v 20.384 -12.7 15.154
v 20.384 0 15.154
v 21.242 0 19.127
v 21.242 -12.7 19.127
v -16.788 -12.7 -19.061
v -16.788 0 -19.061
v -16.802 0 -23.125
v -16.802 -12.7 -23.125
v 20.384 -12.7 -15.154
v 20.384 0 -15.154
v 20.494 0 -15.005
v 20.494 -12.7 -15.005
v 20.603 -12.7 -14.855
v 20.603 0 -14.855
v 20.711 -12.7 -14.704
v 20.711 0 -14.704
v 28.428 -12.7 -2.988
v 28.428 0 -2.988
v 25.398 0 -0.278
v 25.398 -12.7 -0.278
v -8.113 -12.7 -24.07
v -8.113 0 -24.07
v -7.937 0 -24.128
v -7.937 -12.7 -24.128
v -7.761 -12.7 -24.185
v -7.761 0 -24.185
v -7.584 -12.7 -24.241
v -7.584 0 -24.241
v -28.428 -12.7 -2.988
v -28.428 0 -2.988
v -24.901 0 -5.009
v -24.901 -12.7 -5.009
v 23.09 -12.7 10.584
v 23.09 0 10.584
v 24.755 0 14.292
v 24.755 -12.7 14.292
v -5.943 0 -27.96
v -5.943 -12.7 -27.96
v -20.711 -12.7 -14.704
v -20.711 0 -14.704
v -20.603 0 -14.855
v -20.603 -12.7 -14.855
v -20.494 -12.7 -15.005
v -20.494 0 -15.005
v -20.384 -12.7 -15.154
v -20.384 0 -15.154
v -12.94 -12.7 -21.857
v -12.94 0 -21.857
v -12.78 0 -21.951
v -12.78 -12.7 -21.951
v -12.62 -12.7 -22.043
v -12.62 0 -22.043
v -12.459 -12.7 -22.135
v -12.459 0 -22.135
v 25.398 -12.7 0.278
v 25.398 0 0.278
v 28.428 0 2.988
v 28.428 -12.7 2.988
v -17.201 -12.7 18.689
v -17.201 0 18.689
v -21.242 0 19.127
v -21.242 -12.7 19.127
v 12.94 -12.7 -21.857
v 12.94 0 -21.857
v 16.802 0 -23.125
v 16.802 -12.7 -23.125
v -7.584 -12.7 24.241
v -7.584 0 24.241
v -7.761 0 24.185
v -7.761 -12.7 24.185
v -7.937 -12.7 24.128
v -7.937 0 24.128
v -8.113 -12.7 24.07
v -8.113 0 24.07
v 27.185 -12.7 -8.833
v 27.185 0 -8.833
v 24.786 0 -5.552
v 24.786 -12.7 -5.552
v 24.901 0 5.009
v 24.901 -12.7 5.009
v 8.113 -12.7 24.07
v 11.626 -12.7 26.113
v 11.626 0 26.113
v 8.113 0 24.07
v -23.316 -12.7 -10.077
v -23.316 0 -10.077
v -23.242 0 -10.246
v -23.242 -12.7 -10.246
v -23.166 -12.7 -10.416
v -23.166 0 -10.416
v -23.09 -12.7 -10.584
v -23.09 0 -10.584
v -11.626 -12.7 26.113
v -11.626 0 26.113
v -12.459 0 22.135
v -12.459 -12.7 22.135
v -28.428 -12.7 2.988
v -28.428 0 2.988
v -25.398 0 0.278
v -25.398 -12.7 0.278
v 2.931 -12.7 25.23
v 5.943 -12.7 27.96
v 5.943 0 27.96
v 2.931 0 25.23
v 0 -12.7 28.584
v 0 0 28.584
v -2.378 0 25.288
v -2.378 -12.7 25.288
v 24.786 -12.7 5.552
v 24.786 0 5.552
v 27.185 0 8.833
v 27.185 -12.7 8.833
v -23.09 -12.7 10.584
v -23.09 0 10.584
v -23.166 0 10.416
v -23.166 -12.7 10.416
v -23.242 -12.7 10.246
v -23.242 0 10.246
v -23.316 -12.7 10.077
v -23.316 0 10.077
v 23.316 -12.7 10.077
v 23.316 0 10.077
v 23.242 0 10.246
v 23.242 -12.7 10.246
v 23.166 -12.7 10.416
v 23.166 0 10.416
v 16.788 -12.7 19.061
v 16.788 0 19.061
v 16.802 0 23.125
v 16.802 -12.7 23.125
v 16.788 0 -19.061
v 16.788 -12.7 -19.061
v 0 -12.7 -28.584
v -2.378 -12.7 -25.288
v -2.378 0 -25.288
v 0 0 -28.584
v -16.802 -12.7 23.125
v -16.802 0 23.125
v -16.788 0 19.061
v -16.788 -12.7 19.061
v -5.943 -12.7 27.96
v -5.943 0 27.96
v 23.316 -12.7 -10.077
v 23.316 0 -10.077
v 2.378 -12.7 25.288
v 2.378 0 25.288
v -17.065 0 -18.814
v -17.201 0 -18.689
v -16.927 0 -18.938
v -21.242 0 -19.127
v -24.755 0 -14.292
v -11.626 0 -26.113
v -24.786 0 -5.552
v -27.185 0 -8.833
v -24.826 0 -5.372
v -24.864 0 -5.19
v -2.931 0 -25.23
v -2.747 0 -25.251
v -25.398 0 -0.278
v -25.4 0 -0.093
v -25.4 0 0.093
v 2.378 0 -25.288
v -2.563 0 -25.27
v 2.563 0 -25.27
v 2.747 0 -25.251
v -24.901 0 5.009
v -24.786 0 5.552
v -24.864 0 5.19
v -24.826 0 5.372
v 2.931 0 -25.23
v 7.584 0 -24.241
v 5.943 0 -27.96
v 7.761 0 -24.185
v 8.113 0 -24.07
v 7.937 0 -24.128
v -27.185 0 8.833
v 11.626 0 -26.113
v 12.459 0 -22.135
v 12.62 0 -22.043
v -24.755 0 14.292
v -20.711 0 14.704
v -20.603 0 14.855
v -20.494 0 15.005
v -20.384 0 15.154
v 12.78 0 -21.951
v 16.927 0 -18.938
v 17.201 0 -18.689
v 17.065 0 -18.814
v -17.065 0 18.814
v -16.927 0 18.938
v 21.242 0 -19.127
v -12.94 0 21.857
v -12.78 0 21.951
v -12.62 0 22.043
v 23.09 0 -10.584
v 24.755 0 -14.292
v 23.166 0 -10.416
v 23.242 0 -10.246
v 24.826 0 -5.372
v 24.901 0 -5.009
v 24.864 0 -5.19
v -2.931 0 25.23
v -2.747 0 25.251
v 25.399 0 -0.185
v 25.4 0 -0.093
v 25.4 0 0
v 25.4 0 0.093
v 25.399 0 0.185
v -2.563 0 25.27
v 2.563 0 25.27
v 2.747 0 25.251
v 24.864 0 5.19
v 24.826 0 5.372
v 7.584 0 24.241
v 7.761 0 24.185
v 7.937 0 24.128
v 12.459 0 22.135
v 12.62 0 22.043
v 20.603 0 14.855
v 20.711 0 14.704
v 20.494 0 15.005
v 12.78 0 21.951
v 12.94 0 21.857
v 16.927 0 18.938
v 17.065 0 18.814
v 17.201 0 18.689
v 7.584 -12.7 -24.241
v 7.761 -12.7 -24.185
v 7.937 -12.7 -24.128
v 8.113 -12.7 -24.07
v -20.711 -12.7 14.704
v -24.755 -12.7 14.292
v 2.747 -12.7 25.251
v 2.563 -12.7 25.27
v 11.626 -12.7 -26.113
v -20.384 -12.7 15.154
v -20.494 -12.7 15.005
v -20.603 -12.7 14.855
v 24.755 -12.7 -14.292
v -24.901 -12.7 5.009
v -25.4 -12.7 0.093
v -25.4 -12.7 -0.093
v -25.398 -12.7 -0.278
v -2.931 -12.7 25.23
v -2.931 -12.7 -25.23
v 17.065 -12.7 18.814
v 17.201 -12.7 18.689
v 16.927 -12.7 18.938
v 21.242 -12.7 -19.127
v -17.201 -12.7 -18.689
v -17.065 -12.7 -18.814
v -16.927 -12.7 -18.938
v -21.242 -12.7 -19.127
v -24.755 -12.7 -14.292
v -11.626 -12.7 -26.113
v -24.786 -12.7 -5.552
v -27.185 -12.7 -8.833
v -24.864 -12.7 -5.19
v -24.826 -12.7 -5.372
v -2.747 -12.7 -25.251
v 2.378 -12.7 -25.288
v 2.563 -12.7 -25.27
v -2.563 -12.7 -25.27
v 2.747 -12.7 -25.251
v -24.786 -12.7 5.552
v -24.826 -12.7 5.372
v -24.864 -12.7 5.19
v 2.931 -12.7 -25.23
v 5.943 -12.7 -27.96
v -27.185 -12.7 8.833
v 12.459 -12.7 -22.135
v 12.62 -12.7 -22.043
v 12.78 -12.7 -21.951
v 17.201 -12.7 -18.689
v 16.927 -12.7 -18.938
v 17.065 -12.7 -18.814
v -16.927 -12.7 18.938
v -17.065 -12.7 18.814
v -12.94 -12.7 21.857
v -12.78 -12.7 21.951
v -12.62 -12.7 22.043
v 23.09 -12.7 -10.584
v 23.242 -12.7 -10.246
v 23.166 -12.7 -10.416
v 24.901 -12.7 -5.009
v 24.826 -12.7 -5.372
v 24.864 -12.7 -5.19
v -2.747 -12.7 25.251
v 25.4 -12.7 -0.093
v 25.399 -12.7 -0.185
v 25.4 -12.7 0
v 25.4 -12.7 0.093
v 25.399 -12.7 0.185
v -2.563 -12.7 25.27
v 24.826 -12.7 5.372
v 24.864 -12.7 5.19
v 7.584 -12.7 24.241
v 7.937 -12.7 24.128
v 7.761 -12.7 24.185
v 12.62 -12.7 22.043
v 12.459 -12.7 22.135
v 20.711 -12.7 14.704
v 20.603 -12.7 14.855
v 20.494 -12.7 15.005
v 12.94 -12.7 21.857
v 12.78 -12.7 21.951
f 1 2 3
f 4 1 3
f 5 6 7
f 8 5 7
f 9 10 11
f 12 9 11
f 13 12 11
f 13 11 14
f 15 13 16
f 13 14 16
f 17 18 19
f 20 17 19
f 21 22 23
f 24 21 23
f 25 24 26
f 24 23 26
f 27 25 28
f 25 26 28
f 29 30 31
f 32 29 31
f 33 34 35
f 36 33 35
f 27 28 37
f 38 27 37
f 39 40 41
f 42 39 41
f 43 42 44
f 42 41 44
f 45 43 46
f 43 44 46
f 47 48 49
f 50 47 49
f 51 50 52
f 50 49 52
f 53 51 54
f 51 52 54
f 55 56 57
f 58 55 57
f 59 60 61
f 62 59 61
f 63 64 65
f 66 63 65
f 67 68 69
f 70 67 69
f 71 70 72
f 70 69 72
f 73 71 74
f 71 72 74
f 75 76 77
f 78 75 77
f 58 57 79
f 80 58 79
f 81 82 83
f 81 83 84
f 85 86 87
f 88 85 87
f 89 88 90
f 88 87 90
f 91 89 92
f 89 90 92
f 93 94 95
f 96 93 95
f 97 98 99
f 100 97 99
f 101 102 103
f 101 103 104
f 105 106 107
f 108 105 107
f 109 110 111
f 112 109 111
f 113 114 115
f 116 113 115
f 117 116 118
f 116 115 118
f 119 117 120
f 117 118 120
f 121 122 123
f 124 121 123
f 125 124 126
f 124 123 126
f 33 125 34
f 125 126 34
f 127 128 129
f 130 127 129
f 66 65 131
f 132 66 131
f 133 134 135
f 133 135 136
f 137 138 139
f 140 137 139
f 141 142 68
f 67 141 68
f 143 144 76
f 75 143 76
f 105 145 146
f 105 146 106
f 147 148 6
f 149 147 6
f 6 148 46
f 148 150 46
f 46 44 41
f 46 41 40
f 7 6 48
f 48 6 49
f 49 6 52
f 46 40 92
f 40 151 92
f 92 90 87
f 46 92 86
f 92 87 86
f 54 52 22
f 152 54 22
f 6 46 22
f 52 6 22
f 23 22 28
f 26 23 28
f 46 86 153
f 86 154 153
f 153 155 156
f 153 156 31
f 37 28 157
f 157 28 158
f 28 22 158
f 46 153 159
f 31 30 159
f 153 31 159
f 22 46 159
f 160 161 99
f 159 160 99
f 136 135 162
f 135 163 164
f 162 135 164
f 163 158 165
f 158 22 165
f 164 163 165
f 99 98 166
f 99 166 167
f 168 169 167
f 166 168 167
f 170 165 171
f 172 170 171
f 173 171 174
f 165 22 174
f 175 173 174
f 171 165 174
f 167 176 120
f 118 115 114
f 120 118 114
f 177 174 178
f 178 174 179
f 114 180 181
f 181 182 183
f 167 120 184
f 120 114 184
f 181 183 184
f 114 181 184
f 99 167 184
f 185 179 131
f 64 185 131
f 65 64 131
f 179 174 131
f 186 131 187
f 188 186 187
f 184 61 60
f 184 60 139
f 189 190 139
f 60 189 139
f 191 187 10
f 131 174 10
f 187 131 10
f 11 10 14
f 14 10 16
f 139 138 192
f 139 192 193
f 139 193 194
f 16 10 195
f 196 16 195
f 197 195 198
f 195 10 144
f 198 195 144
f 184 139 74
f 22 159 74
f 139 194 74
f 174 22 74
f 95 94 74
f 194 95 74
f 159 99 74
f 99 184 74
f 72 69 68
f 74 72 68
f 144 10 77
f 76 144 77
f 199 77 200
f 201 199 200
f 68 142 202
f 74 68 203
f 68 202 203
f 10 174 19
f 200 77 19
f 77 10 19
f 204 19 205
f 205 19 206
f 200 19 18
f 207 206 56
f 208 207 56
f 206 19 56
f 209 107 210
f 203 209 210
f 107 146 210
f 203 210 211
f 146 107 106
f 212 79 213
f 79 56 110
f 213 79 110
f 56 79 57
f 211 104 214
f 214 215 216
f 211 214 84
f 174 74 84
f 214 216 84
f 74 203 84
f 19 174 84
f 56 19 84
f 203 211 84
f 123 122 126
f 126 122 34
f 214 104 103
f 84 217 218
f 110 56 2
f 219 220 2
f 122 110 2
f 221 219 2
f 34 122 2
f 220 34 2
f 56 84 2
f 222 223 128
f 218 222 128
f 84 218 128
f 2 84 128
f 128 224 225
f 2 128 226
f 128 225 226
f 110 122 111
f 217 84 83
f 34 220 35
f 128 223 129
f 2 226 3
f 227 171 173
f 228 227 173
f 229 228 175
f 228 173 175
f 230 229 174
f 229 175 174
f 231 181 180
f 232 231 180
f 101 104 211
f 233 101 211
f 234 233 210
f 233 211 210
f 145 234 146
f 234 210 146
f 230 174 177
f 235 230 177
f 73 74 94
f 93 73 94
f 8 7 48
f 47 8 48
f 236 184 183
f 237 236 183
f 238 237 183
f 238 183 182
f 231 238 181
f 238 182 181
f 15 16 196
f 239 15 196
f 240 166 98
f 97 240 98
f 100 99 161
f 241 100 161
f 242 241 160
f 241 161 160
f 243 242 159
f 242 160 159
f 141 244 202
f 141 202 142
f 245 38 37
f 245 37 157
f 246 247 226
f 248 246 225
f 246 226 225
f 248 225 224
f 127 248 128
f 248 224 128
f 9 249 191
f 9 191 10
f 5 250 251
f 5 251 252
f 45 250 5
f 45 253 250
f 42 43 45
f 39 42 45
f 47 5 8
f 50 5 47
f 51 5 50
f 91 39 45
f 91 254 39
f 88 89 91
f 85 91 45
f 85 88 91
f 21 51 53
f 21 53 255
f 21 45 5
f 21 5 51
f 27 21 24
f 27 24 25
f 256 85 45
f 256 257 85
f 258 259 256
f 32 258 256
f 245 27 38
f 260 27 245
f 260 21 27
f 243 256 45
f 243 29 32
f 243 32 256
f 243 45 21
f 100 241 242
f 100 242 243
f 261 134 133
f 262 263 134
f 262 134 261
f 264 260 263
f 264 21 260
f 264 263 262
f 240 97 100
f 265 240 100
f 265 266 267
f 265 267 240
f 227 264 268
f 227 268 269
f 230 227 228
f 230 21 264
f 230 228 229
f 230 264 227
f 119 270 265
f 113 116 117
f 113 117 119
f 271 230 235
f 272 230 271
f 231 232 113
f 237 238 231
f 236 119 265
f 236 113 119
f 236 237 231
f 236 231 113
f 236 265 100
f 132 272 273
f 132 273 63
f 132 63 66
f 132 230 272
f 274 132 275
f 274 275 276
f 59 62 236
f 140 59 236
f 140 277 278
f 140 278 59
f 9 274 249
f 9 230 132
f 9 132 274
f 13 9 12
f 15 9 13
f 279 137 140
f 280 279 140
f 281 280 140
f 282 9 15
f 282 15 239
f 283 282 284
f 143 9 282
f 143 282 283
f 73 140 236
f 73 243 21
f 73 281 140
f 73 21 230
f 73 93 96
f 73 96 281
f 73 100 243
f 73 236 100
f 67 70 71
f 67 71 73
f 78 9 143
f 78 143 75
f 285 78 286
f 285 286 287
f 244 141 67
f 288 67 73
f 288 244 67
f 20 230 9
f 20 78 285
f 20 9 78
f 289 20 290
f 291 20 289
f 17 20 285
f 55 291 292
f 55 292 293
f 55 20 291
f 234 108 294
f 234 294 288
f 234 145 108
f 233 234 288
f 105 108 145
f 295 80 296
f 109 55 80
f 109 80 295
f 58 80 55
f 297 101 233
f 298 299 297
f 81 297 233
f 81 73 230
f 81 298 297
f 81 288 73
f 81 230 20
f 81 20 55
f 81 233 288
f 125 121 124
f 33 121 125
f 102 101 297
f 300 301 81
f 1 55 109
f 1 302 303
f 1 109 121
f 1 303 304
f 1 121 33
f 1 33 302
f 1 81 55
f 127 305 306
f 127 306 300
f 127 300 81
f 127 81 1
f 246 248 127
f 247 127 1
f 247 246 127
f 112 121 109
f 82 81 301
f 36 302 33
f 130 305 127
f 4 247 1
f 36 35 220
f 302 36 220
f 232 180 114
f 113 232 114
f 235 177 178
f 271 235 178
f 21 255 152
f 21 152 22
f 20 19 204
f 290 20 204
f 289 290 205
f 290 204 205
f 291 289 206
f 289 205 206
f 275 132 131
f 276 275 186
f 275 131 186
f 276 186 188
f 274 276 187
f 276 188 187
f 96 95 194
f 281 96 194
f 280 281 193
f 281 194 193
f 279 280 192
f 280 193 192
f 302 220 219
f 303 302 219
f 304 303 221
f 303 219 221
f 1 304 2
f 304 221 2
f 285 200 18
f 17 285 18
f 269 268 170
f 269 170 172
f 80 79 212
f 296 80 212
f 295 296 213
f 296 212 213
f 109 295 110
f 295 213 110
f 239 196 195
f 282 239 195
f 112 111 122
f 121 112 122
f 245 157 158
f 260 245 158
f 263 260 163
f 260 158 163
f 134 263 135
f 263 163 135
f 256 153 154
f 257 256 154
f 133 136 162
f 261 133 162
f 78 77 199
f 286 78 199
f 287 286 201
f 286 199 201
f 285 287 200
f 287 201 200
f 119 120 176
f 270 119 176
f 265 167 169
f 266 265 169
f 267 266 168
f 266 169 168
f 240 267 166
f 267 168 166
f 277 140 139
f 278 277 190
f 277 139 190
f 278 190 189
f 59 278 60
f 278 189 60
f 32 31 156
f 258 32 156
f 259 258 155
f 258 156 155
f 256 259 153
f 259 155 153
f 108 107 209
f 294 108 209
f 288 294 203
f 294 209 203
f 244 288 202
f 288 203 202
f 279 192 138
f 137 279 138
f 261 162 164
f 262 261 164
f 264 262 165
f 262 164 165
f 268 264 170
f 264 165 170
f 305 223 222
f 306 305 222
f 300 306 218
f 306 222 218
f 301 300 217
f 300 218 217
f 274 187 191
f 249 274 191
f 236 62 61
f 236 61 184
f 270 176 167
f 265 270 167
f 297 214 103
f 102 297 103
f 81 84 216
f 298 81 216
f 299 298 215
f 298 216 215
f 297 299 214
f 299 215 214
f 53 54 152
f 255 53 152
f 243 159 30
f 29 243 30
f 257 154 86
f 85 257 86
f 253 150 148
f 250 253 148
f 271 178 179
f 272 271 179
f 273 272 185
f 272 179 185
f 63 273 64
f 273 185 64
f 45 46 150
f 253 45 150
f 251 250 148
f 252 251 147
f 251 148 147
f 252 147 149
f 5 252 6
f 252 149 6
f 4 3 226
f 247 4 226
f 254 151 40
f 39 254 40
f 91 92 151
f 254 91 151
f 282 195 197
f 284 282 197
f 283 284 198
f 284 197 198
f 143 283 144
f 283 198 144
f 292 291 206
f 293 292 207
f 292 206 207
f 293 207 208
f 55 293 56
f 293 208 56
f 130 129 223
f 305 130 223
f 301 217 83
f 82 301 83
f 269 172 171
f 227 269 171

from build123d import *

# Parameters (mm, degrees)
F1_DEPTH = 12.7


with BuildPart() as f1:
    # F0 (on Front) → F1 (new body)
    with BuildSketch(Plane.XZ):
        with BuildLine():
            ThreePointArc((25.398479, -0.277923), (25.39962, -0.138964), (25.4, 0))
            ThreePointArc((25.4, 0), (25.39962, 0.138964), (25.398479, 0.277923))
            ThreePointArc((25.398479, 0.277923), (25.260856, 2.655023), (24.901245, 5.008791))
            ThreePointArc((24.901245, 5.008791), (24.844949, 5.280957), (24.785678, 5.552491))
            ThreePointArc((24.785678, 5.552491), (24.156836, 7.849032), (23.315707, 10.076597))
            ThreePointArc((23.315707, 10.076597), (23.204055, 10.331111), (23.089624, 10.584388))
            ThreePointArc((23.089624, 10.584388), (21.997045, 12.7), (20.711161, 14.704007))
            ThreePointArc((20.711161, 14.704007), (20.549032, 14.929745), (20.384442, 15.153696))
            ThreePointArc((20.384442, 15.153696), (18.875879, 16.995917), (17.201437, 18.688782))
            ThreePointArc((17.201437, 18.688782), (16.995917, 18.875879), (16.788363, 19.060715))
            ThreePointArc((16.788363, 19.060715), (14.929745, 20.549032), (12.939928, 21.856767))
            ThreePointArc((12.939928, 21.856767), (12.7, 21.997045), (12.458551, 22.13469))
            ThreePointArc((12.458551, 22.13469), (10.331111, 23.204055), (8.112882, 24.069506))
            ThreePointArc((8.112882, 24.069506), (7.849032, 24.156836), (7.584241, 24.241272))
            ThreePointArc((7.584241, 24.241272), (5.280957, 24.844949), (2.931265, 25.230293))
            ThreePointArc((2.931265, 25.230293), (2.655023, 25.260856), (2.378463, 25.288395))
            ThreePointArc((2.378463, 25.288395), (0, 25.4), (-2.378463, 25.288395))
            ThreePointArc((-2.378463, 25.288395), (-2.655023, 25.260856), (-2.931265, 25.230293))
            ThreePointArc((-2.931265, 25.230293), (-5.280957, 24.844949), (-7.584241, 24.241272))
            ThreePointArc((-7.584241, 24.241272), (-7.849032, 24.156836), (-8.112882, 24.069506))
            ThreePointArc((-8.112882, 24.069506), (-10.331111, 23.204055), (-12.458551, 22.13469))
            ThreePointArc((-12.458551, 22.13469), (-12.7, 21.997045), (-12.939928, 21.856767))
            ThreePointArc((-12.939928, 21.856767), (-14.929745, 20.549032), (-16.788363, 19.060715))
            ThreePointArc((-16.788363, 19.060715), (-16.995917, 18.875879), (-17.201437, 18.688782))
            ThreePointArc((-17.201437, 18.688782), (-18.875879, 16.995917), (-20.384442, 15.153696))
            ThreePointArc((-20.384442, 15.153696), (-20.549032, 14.929745), (-20.711161, 14.704007))
            ThreePointArc((-20.711161, 14.704007), (-21.997045, 12.7), (-23.089624, 10.584388))
            ThreePointArc((-23.089624, 10.584388), (-23.204055, 10.331111), (-23.315707, 10.076597))
            ThreePointArc((-23.315707, 10.076597), (-24.156836, 7.849032), (-24.785678, 5.552491))
            ThreePointArc((-24.785678, 5.552491), (-24.844949, 5.280957), (-24.901245, 5.008791))
            ThreePointArc((-24.901245, 5.008791), (-25.260856, 2.655023), (-25.398479, 0.277923))
            ThreePointArc((-25.398479, 0.277923), (-25.4, 0), (-25.398479, -0.277923))
            ThreePointArc((-25.398479, -0.277923), (-25.260856, -2.655023), (-24.901245, -5.008791))
            ThreePointArc((-24.901245, -5.008791), (-24.844949, -5.280957), (-24.785678, -5.552491))
            ThreePointArc((-24.785678, -5.552491), (-24.156836, -7.849032), (-23.315707, -10.076597))
            ThreePointArc((-23.315707, -10.076597), (-23.204055, -10.331111), (-23.089624, -10.584388))
            ThreePointArc((-23.089624, -10.584388), (-21.997045, -12.7), (-20.711161, -14.704007))
            ThreePointArc((-20.711161, -14.704007), (-20.549032, -14.929745), (-20.384442, -15.153696))
            ThreePointArc((-20.384442, -15.153696), (-18.875879, -16.995917), (-17.201437, -18.688782))
            ThreePointArc((-17.201437, -18.688782), (-16.995917, -18.875879), (-16.788363, -19.060715))
            ThreePointArc((-16.788363, -19.060715), (-14.929745, -20.549032), (-12.939928, -21.856767))
            ThreePointArc((-12.939928, -21.856767), (-12.7, -21.997045), (-12.458551, -22.13469))
            ThreePointArc((-12.458551, -22.13469), (-10.331111, -23.204055), (-8.112882, -24.069506))
            ThreePointArc((-8.112882, -24.069506), (-7.849032, -24.156836), (-7.584241, -24.241272))
            ThreePointArc((-7.584241, -24.241272), (-5.280957, -24.844949), (-2.931265, -25.230293))
            ThreePointArc((-2.931265, -25.230293), (-2.655023, -25.260856), (-2.378463, -25.288395))
            ThreePointArc((-2.378463, -25.288395), (0, -25.4), (2.378463, -25.288395))
            ThreePointArc((2.378463, -25.288395), (2.655023, -25.260856), (2.931265, -25.230293))
            ThreePointArc((2.931265, -25.230293), (5.280957, -24.844949), (7.584241, -24.241272))
            ThreePointArc((7.584241, -24.241272), (7.849032, -24.156836), (8.112882, -24.069506))
            ThreePointArc((8.112882, -24.069506), (10.331111, -23.204055), (12.458551, -22.13469))
            ThreePointArc((12.458551, -22.13469), (12.7, -21.997045), (12.939928, -21.856767))
            ThreePointArc((12.939928, -21.856767), (14.929745, -20.549032), (16.788363, -19.060715))
            ThreePointArc((16.788363, -19.060715), (16.995917, -18.875879), (17.201437, -18.688782))
            ThreePointArc((17.201437, -18.688782), (18.875879, -16.995917), (20.384442, -15.153696))
            ThreePointArc((20.384442, -15.153696), (20.549032, -14.929745), (20.711161, -14.704007))
            ThreePointArc((20.711161, -14.704007), (21.997045, -12.7), (23.089624, -10.584388))
            ThreePointArc((23.089624, -10.584388), (23.204055, -10.331111), (23.315707, -10.076597))
            ThreePointArc((23.315707, -10.076597), (24.156836, -7.849032), (24.785678, -5.552491))
            ThreePointArc((24.785678, -5.552491), (24.844949, -5.280957), (24.901245, -5.008791))
            ThreePointArc((24.901245, -5.008791), (25.260856, -2.655023), (25.398479, -0.277923))
        make_face()
        with BuildLine():
            ThreePointArc((24.901245, 5.008791), (25.260856, 2.655023), (25.398479, 0.277923))
            Line((25.398479, 0.277923), (28.427847, 2.987887))
            Line((28.427847, 2.987887), (24.901245, 5.008791))
        make_face()
        with BuildLine():
            Line((28.427847, -2.987887), (25.398479, -0.277923))
            ThreePointArc((25.398479, -0.277923), (25.260856, -2.655023), (24.901245, -5.008791))
            Line((24.901245, -5.008791), (28.427847, -2.987887))
        make_face()
        with BuildLine():
            ThreePointArc((23.315707, 10.076597), (24.156836, 7.849032), (24.785678, 5.552491))
            Line((24.785678, 5.552491), (27.185414, 8.833076))
            Line((27.185414, 8.833076), (23.315707, 10.076597))
        make_face()
        with BuildLine():
            Line((27.185414, -8.833076), (24.785678, -5.552491))
            ThreePointArc((24.785678, -5.552491), (24.156836, -7.849032), (23.315707, -10.076597))
            Line((23.315707, -10.076597), (27.185414, -8.833076))
        make_face()
        with BuildLine():
            ThreePointArc((20.711161, 14.704007), (21.997045, 12.7), (23.089624, 10.584388))
            Line((23.089624, 10.584388), (24.754847, 14.292218))
            Line((24.754847, 14.292218), (20.711161, 14.704007))
        make_face()
        with BuildLine():
            Line((24.754847, -14.292218), (23.089624, -10.584388))
            ThreePointArc((23.089624, -10.584388), (21.997045, -12.7), (20.711161, -14.704007))
            Line((20.711161, -14.704007), (24.754847, -14.292218))
        make_face()
        with BuildLine():
            ThreePointArc((17.201437, 18.688782), (18.875879, 16.995917), (20.384442, 15.153696))
            Line((20.384442, 15.153696), (21.242375, 19.126721))
            Line((21.242375, 19.126721), (17.201437, 18.688782))
        make_face()
        with BuildLine():
            Line((21.242375, -19.126721), (20.384442, -15.153696))
            ThreePointArc((20.384442, -15.153696), (18.875879, -16.995917), (17.201437, -18.688782))
            Line((17.201437, -18.688782), (21.242375, -19.126721))
        make_face()
        with BuildLine():
            ThreePointArc((12.939928, 21.856767), (14.929745, 20.549032), (16.788363, 19.060715))
            Line((16.788363, 19.060715), (16.80151, 23.125294))
            Line((16.80151, 23.125294), (12.939928, 21.856767))
        make_face()
        with BuildLine():
            Line((16.80151, -23.125294), (16.788363, -19.060715))
            ThreePointArc((16.788363, -19.060715), (14.929745, -20.549032), (12.939928, -21.856767))
            Line((12.939928, -21.856767), (16.80151, -23.125294))
        make_face()
        with BuildLine():
            ThreePointArc((8.112882, 24.069506), (10.331111, 23.204055), (12.458551, 22.13469))
            Line((12.458551, 22.13469), (11.626337, 26.113181))
            Line((11.626337, 26.113181), (8.112882, 24.069506))
        make_face()
        with BuildLine():
            Line((11.626337, -26.113181), (12.458551, -22.13469))
            ThreePointArc((12.458551, -22.13469), (10.331111, -23.204055), (8.112882, -24.069506))
            Line((8.112882, -24.069506), (11.626337, -26.113181))
        make_face()
        with BuildLine():
            ThreePointArc((2.931265, 25.230293), (5.280957, 24.844949), (7.584241, 24.241272))
            Line((7.584241, 24.241272), (5.943038, 27.959797))
            Line((5.943038, 27.959797), (2.931265, 25.230293))
        make_face()
        with BuildLine():
            Line((5.943038, -27.959797), (7.584241, -24.241272))
            ThreePointArc((7.584241, -24.241272), (5.280957, -24.844949), (2.931265, -25.230293))
            Line((2.931265, -25.230293), (5.943038, -27.959797))
        make_face()
        with BuildLine():
            ThreePointArc((-2.378463, 25.288395), (0, 25.4), (2.378463, 25.288395))
            Line((2.378463, 25.288395), (0, 28.584436))
            Line((0, 28.584436), (-2.378463, 25.288395))
        make_face()
        with BuildLine():
            Line((0, -28.584436), (2.378463, -25.288395))
            ThreePointArc((2.378463, -25.288395), (0, -25.4), (-2.378463, -25.288395))
            Line((-2.378463, -25.288395), (0, -28.584436))
        make_face()
        with BuildLine():
            ThreePointArc((-7.584241, 24.241272), (-5.280957, 24.844949), (-2.931265, 25.230293))
            Line((-2.931265, 25.230293), (-5.943038, 27.959797))
            Line((-5.943038, 27.959797), (-7.584241, 24.241272))
        make_face()
        with BuildLine():
            Line((-5.943038, -27.959797), (-2.931265, -25.230293))
            ThreePointArc((-2.931265, -25.230293), (-5.280957, -24.844949), (-7.584241, -24.241272))
            Line((-7.584241, -24.241272), (-5.943038, -27.959797))
        make_face()
        with BuildLine():
            ThreePointArc((-12.458551, 22.13469), (-10.331111, 23.204055), (-8.112882, 24.069506))
            Line((-8.112882, 24.069506), (-11.626337, 26.113181))
            Line((-11.626337, 26.113181), (-12.458551, 22.13469))
        make_face()
        with BuildLine():
            Line((-11.626337, -26.113181), (-8.112882, -24.069506))
            ThreePointArc((-8.112882, -24.069506), (-10.331111, -23.204055), (-12.458551, -22.13469))
            Line((-12.458551, -22.13469), (-11.626337, -26.113181))
        make_face()
        with BuildLine():
            ThreePointArc((-16.788363, 19.060715), (-14.929745, 20.549032), (-12.939928, 21.856767))
            Line((-12.939928, 21.856767), (-16.80151, 23.125294))
            Line((-16.80151, 23.125294), (-16.788363, 19.060715))
        make_face()
        with BuildLine():
            Line((-16.80151, -23.125294), (-12.939928, -21.856767))
            ThreePointArc((-12.939928, -21.856767), (-14.929745, -20.549032), (-16.788363, -19.060715))
            Line((-16.788363, -19.060715), (-16.80151, -23.125294))
        make_face()
        with BuildLine():
            ThreePointArc((-20.384442, 15.153696), (-18.875879, 16.995917), (-17.201437, 18.688782))
            Line((-17.201437, 18.688782), (-21.242375, 19.126721))
            Line((-21.242375, 19.126721), (-20.384442, 15.153696))
        make_face()
        with BuildLine():
            Line((-21.242375, -19.126721), (-17.201437, -18.688782))
            ThreePointArc((-17.201437, -18.688782), (-18.875879, -16.995917), (-20.384442, -15.153696))
            Line((-20.384442, -15.153696), (-21.242375, -19.126721))
        make_face()
        with BuildLine():
            ThreePointArc((-23.089624, 10.584388), (-21.997045, 12.7), (-20.711161, 14.704007))
            Line((-20.711161, 14.704007), (-24.754847, 14.292218))
            Line((-24.754847, 14.292218), (-23.089624, 10.584388))
        make_face()
        with BuildLine():
            Line((-24.754847, -14.292218), (-20.711161, -14.704007))
            ThreePointArc((-20.711161, -14.704007), (-21.997045, -12.7), (-23.089624, -10.584388))
            Line((-23.089624, -10.584388), (-24.754847, -14.292218))
        make_face()
        with BuildLine():
            ThreePointArc((-24.785678, 5.552491), (-24.156836, 7.849032), (-23.315707, 10.076597))
            Line((-23.315707, 10.076597), (-27.185414, 8.833076))
            Line((-27.185414, 8.833076), (-24.785678, 5.552491))
        make_face()
        with BuildLine():
            Line((-27.185414, -8.833076), (-23.315707, -10.076597))
            ThreePointArc((-23.315707, -10.076597), (-24.156836, -7.849032), (-24.785678, -5.552491))
            Line((-24.785678, -5.552491), (-27.185414, -8.833076))
        make_face()
        with BuildLine():
            ThreePointArc((-25.398479, 0.277923), (-25.260856, 2.655023), (-24.901245, 5.008791))
            Line((-24.901245, 5.008791), (-28.427847, 2.987887))
            Line((-28.427847, 2.987887), (-25.398479, 0.277923))
        make_face()
        with BuildLine():
            Line((-28.427847, -2.987887), (-24.901245, -5.008791))
            ThreePointArc((-24.901245, -5.008791), (-25.260856, -2.655023), (-25.398479, -0.277923))
            Line((-25.398479, -0.277923), (-28.427847, -2.987887))
        make_face()
    extrude(amount=F1_DEPTH)


solid = f1.part
